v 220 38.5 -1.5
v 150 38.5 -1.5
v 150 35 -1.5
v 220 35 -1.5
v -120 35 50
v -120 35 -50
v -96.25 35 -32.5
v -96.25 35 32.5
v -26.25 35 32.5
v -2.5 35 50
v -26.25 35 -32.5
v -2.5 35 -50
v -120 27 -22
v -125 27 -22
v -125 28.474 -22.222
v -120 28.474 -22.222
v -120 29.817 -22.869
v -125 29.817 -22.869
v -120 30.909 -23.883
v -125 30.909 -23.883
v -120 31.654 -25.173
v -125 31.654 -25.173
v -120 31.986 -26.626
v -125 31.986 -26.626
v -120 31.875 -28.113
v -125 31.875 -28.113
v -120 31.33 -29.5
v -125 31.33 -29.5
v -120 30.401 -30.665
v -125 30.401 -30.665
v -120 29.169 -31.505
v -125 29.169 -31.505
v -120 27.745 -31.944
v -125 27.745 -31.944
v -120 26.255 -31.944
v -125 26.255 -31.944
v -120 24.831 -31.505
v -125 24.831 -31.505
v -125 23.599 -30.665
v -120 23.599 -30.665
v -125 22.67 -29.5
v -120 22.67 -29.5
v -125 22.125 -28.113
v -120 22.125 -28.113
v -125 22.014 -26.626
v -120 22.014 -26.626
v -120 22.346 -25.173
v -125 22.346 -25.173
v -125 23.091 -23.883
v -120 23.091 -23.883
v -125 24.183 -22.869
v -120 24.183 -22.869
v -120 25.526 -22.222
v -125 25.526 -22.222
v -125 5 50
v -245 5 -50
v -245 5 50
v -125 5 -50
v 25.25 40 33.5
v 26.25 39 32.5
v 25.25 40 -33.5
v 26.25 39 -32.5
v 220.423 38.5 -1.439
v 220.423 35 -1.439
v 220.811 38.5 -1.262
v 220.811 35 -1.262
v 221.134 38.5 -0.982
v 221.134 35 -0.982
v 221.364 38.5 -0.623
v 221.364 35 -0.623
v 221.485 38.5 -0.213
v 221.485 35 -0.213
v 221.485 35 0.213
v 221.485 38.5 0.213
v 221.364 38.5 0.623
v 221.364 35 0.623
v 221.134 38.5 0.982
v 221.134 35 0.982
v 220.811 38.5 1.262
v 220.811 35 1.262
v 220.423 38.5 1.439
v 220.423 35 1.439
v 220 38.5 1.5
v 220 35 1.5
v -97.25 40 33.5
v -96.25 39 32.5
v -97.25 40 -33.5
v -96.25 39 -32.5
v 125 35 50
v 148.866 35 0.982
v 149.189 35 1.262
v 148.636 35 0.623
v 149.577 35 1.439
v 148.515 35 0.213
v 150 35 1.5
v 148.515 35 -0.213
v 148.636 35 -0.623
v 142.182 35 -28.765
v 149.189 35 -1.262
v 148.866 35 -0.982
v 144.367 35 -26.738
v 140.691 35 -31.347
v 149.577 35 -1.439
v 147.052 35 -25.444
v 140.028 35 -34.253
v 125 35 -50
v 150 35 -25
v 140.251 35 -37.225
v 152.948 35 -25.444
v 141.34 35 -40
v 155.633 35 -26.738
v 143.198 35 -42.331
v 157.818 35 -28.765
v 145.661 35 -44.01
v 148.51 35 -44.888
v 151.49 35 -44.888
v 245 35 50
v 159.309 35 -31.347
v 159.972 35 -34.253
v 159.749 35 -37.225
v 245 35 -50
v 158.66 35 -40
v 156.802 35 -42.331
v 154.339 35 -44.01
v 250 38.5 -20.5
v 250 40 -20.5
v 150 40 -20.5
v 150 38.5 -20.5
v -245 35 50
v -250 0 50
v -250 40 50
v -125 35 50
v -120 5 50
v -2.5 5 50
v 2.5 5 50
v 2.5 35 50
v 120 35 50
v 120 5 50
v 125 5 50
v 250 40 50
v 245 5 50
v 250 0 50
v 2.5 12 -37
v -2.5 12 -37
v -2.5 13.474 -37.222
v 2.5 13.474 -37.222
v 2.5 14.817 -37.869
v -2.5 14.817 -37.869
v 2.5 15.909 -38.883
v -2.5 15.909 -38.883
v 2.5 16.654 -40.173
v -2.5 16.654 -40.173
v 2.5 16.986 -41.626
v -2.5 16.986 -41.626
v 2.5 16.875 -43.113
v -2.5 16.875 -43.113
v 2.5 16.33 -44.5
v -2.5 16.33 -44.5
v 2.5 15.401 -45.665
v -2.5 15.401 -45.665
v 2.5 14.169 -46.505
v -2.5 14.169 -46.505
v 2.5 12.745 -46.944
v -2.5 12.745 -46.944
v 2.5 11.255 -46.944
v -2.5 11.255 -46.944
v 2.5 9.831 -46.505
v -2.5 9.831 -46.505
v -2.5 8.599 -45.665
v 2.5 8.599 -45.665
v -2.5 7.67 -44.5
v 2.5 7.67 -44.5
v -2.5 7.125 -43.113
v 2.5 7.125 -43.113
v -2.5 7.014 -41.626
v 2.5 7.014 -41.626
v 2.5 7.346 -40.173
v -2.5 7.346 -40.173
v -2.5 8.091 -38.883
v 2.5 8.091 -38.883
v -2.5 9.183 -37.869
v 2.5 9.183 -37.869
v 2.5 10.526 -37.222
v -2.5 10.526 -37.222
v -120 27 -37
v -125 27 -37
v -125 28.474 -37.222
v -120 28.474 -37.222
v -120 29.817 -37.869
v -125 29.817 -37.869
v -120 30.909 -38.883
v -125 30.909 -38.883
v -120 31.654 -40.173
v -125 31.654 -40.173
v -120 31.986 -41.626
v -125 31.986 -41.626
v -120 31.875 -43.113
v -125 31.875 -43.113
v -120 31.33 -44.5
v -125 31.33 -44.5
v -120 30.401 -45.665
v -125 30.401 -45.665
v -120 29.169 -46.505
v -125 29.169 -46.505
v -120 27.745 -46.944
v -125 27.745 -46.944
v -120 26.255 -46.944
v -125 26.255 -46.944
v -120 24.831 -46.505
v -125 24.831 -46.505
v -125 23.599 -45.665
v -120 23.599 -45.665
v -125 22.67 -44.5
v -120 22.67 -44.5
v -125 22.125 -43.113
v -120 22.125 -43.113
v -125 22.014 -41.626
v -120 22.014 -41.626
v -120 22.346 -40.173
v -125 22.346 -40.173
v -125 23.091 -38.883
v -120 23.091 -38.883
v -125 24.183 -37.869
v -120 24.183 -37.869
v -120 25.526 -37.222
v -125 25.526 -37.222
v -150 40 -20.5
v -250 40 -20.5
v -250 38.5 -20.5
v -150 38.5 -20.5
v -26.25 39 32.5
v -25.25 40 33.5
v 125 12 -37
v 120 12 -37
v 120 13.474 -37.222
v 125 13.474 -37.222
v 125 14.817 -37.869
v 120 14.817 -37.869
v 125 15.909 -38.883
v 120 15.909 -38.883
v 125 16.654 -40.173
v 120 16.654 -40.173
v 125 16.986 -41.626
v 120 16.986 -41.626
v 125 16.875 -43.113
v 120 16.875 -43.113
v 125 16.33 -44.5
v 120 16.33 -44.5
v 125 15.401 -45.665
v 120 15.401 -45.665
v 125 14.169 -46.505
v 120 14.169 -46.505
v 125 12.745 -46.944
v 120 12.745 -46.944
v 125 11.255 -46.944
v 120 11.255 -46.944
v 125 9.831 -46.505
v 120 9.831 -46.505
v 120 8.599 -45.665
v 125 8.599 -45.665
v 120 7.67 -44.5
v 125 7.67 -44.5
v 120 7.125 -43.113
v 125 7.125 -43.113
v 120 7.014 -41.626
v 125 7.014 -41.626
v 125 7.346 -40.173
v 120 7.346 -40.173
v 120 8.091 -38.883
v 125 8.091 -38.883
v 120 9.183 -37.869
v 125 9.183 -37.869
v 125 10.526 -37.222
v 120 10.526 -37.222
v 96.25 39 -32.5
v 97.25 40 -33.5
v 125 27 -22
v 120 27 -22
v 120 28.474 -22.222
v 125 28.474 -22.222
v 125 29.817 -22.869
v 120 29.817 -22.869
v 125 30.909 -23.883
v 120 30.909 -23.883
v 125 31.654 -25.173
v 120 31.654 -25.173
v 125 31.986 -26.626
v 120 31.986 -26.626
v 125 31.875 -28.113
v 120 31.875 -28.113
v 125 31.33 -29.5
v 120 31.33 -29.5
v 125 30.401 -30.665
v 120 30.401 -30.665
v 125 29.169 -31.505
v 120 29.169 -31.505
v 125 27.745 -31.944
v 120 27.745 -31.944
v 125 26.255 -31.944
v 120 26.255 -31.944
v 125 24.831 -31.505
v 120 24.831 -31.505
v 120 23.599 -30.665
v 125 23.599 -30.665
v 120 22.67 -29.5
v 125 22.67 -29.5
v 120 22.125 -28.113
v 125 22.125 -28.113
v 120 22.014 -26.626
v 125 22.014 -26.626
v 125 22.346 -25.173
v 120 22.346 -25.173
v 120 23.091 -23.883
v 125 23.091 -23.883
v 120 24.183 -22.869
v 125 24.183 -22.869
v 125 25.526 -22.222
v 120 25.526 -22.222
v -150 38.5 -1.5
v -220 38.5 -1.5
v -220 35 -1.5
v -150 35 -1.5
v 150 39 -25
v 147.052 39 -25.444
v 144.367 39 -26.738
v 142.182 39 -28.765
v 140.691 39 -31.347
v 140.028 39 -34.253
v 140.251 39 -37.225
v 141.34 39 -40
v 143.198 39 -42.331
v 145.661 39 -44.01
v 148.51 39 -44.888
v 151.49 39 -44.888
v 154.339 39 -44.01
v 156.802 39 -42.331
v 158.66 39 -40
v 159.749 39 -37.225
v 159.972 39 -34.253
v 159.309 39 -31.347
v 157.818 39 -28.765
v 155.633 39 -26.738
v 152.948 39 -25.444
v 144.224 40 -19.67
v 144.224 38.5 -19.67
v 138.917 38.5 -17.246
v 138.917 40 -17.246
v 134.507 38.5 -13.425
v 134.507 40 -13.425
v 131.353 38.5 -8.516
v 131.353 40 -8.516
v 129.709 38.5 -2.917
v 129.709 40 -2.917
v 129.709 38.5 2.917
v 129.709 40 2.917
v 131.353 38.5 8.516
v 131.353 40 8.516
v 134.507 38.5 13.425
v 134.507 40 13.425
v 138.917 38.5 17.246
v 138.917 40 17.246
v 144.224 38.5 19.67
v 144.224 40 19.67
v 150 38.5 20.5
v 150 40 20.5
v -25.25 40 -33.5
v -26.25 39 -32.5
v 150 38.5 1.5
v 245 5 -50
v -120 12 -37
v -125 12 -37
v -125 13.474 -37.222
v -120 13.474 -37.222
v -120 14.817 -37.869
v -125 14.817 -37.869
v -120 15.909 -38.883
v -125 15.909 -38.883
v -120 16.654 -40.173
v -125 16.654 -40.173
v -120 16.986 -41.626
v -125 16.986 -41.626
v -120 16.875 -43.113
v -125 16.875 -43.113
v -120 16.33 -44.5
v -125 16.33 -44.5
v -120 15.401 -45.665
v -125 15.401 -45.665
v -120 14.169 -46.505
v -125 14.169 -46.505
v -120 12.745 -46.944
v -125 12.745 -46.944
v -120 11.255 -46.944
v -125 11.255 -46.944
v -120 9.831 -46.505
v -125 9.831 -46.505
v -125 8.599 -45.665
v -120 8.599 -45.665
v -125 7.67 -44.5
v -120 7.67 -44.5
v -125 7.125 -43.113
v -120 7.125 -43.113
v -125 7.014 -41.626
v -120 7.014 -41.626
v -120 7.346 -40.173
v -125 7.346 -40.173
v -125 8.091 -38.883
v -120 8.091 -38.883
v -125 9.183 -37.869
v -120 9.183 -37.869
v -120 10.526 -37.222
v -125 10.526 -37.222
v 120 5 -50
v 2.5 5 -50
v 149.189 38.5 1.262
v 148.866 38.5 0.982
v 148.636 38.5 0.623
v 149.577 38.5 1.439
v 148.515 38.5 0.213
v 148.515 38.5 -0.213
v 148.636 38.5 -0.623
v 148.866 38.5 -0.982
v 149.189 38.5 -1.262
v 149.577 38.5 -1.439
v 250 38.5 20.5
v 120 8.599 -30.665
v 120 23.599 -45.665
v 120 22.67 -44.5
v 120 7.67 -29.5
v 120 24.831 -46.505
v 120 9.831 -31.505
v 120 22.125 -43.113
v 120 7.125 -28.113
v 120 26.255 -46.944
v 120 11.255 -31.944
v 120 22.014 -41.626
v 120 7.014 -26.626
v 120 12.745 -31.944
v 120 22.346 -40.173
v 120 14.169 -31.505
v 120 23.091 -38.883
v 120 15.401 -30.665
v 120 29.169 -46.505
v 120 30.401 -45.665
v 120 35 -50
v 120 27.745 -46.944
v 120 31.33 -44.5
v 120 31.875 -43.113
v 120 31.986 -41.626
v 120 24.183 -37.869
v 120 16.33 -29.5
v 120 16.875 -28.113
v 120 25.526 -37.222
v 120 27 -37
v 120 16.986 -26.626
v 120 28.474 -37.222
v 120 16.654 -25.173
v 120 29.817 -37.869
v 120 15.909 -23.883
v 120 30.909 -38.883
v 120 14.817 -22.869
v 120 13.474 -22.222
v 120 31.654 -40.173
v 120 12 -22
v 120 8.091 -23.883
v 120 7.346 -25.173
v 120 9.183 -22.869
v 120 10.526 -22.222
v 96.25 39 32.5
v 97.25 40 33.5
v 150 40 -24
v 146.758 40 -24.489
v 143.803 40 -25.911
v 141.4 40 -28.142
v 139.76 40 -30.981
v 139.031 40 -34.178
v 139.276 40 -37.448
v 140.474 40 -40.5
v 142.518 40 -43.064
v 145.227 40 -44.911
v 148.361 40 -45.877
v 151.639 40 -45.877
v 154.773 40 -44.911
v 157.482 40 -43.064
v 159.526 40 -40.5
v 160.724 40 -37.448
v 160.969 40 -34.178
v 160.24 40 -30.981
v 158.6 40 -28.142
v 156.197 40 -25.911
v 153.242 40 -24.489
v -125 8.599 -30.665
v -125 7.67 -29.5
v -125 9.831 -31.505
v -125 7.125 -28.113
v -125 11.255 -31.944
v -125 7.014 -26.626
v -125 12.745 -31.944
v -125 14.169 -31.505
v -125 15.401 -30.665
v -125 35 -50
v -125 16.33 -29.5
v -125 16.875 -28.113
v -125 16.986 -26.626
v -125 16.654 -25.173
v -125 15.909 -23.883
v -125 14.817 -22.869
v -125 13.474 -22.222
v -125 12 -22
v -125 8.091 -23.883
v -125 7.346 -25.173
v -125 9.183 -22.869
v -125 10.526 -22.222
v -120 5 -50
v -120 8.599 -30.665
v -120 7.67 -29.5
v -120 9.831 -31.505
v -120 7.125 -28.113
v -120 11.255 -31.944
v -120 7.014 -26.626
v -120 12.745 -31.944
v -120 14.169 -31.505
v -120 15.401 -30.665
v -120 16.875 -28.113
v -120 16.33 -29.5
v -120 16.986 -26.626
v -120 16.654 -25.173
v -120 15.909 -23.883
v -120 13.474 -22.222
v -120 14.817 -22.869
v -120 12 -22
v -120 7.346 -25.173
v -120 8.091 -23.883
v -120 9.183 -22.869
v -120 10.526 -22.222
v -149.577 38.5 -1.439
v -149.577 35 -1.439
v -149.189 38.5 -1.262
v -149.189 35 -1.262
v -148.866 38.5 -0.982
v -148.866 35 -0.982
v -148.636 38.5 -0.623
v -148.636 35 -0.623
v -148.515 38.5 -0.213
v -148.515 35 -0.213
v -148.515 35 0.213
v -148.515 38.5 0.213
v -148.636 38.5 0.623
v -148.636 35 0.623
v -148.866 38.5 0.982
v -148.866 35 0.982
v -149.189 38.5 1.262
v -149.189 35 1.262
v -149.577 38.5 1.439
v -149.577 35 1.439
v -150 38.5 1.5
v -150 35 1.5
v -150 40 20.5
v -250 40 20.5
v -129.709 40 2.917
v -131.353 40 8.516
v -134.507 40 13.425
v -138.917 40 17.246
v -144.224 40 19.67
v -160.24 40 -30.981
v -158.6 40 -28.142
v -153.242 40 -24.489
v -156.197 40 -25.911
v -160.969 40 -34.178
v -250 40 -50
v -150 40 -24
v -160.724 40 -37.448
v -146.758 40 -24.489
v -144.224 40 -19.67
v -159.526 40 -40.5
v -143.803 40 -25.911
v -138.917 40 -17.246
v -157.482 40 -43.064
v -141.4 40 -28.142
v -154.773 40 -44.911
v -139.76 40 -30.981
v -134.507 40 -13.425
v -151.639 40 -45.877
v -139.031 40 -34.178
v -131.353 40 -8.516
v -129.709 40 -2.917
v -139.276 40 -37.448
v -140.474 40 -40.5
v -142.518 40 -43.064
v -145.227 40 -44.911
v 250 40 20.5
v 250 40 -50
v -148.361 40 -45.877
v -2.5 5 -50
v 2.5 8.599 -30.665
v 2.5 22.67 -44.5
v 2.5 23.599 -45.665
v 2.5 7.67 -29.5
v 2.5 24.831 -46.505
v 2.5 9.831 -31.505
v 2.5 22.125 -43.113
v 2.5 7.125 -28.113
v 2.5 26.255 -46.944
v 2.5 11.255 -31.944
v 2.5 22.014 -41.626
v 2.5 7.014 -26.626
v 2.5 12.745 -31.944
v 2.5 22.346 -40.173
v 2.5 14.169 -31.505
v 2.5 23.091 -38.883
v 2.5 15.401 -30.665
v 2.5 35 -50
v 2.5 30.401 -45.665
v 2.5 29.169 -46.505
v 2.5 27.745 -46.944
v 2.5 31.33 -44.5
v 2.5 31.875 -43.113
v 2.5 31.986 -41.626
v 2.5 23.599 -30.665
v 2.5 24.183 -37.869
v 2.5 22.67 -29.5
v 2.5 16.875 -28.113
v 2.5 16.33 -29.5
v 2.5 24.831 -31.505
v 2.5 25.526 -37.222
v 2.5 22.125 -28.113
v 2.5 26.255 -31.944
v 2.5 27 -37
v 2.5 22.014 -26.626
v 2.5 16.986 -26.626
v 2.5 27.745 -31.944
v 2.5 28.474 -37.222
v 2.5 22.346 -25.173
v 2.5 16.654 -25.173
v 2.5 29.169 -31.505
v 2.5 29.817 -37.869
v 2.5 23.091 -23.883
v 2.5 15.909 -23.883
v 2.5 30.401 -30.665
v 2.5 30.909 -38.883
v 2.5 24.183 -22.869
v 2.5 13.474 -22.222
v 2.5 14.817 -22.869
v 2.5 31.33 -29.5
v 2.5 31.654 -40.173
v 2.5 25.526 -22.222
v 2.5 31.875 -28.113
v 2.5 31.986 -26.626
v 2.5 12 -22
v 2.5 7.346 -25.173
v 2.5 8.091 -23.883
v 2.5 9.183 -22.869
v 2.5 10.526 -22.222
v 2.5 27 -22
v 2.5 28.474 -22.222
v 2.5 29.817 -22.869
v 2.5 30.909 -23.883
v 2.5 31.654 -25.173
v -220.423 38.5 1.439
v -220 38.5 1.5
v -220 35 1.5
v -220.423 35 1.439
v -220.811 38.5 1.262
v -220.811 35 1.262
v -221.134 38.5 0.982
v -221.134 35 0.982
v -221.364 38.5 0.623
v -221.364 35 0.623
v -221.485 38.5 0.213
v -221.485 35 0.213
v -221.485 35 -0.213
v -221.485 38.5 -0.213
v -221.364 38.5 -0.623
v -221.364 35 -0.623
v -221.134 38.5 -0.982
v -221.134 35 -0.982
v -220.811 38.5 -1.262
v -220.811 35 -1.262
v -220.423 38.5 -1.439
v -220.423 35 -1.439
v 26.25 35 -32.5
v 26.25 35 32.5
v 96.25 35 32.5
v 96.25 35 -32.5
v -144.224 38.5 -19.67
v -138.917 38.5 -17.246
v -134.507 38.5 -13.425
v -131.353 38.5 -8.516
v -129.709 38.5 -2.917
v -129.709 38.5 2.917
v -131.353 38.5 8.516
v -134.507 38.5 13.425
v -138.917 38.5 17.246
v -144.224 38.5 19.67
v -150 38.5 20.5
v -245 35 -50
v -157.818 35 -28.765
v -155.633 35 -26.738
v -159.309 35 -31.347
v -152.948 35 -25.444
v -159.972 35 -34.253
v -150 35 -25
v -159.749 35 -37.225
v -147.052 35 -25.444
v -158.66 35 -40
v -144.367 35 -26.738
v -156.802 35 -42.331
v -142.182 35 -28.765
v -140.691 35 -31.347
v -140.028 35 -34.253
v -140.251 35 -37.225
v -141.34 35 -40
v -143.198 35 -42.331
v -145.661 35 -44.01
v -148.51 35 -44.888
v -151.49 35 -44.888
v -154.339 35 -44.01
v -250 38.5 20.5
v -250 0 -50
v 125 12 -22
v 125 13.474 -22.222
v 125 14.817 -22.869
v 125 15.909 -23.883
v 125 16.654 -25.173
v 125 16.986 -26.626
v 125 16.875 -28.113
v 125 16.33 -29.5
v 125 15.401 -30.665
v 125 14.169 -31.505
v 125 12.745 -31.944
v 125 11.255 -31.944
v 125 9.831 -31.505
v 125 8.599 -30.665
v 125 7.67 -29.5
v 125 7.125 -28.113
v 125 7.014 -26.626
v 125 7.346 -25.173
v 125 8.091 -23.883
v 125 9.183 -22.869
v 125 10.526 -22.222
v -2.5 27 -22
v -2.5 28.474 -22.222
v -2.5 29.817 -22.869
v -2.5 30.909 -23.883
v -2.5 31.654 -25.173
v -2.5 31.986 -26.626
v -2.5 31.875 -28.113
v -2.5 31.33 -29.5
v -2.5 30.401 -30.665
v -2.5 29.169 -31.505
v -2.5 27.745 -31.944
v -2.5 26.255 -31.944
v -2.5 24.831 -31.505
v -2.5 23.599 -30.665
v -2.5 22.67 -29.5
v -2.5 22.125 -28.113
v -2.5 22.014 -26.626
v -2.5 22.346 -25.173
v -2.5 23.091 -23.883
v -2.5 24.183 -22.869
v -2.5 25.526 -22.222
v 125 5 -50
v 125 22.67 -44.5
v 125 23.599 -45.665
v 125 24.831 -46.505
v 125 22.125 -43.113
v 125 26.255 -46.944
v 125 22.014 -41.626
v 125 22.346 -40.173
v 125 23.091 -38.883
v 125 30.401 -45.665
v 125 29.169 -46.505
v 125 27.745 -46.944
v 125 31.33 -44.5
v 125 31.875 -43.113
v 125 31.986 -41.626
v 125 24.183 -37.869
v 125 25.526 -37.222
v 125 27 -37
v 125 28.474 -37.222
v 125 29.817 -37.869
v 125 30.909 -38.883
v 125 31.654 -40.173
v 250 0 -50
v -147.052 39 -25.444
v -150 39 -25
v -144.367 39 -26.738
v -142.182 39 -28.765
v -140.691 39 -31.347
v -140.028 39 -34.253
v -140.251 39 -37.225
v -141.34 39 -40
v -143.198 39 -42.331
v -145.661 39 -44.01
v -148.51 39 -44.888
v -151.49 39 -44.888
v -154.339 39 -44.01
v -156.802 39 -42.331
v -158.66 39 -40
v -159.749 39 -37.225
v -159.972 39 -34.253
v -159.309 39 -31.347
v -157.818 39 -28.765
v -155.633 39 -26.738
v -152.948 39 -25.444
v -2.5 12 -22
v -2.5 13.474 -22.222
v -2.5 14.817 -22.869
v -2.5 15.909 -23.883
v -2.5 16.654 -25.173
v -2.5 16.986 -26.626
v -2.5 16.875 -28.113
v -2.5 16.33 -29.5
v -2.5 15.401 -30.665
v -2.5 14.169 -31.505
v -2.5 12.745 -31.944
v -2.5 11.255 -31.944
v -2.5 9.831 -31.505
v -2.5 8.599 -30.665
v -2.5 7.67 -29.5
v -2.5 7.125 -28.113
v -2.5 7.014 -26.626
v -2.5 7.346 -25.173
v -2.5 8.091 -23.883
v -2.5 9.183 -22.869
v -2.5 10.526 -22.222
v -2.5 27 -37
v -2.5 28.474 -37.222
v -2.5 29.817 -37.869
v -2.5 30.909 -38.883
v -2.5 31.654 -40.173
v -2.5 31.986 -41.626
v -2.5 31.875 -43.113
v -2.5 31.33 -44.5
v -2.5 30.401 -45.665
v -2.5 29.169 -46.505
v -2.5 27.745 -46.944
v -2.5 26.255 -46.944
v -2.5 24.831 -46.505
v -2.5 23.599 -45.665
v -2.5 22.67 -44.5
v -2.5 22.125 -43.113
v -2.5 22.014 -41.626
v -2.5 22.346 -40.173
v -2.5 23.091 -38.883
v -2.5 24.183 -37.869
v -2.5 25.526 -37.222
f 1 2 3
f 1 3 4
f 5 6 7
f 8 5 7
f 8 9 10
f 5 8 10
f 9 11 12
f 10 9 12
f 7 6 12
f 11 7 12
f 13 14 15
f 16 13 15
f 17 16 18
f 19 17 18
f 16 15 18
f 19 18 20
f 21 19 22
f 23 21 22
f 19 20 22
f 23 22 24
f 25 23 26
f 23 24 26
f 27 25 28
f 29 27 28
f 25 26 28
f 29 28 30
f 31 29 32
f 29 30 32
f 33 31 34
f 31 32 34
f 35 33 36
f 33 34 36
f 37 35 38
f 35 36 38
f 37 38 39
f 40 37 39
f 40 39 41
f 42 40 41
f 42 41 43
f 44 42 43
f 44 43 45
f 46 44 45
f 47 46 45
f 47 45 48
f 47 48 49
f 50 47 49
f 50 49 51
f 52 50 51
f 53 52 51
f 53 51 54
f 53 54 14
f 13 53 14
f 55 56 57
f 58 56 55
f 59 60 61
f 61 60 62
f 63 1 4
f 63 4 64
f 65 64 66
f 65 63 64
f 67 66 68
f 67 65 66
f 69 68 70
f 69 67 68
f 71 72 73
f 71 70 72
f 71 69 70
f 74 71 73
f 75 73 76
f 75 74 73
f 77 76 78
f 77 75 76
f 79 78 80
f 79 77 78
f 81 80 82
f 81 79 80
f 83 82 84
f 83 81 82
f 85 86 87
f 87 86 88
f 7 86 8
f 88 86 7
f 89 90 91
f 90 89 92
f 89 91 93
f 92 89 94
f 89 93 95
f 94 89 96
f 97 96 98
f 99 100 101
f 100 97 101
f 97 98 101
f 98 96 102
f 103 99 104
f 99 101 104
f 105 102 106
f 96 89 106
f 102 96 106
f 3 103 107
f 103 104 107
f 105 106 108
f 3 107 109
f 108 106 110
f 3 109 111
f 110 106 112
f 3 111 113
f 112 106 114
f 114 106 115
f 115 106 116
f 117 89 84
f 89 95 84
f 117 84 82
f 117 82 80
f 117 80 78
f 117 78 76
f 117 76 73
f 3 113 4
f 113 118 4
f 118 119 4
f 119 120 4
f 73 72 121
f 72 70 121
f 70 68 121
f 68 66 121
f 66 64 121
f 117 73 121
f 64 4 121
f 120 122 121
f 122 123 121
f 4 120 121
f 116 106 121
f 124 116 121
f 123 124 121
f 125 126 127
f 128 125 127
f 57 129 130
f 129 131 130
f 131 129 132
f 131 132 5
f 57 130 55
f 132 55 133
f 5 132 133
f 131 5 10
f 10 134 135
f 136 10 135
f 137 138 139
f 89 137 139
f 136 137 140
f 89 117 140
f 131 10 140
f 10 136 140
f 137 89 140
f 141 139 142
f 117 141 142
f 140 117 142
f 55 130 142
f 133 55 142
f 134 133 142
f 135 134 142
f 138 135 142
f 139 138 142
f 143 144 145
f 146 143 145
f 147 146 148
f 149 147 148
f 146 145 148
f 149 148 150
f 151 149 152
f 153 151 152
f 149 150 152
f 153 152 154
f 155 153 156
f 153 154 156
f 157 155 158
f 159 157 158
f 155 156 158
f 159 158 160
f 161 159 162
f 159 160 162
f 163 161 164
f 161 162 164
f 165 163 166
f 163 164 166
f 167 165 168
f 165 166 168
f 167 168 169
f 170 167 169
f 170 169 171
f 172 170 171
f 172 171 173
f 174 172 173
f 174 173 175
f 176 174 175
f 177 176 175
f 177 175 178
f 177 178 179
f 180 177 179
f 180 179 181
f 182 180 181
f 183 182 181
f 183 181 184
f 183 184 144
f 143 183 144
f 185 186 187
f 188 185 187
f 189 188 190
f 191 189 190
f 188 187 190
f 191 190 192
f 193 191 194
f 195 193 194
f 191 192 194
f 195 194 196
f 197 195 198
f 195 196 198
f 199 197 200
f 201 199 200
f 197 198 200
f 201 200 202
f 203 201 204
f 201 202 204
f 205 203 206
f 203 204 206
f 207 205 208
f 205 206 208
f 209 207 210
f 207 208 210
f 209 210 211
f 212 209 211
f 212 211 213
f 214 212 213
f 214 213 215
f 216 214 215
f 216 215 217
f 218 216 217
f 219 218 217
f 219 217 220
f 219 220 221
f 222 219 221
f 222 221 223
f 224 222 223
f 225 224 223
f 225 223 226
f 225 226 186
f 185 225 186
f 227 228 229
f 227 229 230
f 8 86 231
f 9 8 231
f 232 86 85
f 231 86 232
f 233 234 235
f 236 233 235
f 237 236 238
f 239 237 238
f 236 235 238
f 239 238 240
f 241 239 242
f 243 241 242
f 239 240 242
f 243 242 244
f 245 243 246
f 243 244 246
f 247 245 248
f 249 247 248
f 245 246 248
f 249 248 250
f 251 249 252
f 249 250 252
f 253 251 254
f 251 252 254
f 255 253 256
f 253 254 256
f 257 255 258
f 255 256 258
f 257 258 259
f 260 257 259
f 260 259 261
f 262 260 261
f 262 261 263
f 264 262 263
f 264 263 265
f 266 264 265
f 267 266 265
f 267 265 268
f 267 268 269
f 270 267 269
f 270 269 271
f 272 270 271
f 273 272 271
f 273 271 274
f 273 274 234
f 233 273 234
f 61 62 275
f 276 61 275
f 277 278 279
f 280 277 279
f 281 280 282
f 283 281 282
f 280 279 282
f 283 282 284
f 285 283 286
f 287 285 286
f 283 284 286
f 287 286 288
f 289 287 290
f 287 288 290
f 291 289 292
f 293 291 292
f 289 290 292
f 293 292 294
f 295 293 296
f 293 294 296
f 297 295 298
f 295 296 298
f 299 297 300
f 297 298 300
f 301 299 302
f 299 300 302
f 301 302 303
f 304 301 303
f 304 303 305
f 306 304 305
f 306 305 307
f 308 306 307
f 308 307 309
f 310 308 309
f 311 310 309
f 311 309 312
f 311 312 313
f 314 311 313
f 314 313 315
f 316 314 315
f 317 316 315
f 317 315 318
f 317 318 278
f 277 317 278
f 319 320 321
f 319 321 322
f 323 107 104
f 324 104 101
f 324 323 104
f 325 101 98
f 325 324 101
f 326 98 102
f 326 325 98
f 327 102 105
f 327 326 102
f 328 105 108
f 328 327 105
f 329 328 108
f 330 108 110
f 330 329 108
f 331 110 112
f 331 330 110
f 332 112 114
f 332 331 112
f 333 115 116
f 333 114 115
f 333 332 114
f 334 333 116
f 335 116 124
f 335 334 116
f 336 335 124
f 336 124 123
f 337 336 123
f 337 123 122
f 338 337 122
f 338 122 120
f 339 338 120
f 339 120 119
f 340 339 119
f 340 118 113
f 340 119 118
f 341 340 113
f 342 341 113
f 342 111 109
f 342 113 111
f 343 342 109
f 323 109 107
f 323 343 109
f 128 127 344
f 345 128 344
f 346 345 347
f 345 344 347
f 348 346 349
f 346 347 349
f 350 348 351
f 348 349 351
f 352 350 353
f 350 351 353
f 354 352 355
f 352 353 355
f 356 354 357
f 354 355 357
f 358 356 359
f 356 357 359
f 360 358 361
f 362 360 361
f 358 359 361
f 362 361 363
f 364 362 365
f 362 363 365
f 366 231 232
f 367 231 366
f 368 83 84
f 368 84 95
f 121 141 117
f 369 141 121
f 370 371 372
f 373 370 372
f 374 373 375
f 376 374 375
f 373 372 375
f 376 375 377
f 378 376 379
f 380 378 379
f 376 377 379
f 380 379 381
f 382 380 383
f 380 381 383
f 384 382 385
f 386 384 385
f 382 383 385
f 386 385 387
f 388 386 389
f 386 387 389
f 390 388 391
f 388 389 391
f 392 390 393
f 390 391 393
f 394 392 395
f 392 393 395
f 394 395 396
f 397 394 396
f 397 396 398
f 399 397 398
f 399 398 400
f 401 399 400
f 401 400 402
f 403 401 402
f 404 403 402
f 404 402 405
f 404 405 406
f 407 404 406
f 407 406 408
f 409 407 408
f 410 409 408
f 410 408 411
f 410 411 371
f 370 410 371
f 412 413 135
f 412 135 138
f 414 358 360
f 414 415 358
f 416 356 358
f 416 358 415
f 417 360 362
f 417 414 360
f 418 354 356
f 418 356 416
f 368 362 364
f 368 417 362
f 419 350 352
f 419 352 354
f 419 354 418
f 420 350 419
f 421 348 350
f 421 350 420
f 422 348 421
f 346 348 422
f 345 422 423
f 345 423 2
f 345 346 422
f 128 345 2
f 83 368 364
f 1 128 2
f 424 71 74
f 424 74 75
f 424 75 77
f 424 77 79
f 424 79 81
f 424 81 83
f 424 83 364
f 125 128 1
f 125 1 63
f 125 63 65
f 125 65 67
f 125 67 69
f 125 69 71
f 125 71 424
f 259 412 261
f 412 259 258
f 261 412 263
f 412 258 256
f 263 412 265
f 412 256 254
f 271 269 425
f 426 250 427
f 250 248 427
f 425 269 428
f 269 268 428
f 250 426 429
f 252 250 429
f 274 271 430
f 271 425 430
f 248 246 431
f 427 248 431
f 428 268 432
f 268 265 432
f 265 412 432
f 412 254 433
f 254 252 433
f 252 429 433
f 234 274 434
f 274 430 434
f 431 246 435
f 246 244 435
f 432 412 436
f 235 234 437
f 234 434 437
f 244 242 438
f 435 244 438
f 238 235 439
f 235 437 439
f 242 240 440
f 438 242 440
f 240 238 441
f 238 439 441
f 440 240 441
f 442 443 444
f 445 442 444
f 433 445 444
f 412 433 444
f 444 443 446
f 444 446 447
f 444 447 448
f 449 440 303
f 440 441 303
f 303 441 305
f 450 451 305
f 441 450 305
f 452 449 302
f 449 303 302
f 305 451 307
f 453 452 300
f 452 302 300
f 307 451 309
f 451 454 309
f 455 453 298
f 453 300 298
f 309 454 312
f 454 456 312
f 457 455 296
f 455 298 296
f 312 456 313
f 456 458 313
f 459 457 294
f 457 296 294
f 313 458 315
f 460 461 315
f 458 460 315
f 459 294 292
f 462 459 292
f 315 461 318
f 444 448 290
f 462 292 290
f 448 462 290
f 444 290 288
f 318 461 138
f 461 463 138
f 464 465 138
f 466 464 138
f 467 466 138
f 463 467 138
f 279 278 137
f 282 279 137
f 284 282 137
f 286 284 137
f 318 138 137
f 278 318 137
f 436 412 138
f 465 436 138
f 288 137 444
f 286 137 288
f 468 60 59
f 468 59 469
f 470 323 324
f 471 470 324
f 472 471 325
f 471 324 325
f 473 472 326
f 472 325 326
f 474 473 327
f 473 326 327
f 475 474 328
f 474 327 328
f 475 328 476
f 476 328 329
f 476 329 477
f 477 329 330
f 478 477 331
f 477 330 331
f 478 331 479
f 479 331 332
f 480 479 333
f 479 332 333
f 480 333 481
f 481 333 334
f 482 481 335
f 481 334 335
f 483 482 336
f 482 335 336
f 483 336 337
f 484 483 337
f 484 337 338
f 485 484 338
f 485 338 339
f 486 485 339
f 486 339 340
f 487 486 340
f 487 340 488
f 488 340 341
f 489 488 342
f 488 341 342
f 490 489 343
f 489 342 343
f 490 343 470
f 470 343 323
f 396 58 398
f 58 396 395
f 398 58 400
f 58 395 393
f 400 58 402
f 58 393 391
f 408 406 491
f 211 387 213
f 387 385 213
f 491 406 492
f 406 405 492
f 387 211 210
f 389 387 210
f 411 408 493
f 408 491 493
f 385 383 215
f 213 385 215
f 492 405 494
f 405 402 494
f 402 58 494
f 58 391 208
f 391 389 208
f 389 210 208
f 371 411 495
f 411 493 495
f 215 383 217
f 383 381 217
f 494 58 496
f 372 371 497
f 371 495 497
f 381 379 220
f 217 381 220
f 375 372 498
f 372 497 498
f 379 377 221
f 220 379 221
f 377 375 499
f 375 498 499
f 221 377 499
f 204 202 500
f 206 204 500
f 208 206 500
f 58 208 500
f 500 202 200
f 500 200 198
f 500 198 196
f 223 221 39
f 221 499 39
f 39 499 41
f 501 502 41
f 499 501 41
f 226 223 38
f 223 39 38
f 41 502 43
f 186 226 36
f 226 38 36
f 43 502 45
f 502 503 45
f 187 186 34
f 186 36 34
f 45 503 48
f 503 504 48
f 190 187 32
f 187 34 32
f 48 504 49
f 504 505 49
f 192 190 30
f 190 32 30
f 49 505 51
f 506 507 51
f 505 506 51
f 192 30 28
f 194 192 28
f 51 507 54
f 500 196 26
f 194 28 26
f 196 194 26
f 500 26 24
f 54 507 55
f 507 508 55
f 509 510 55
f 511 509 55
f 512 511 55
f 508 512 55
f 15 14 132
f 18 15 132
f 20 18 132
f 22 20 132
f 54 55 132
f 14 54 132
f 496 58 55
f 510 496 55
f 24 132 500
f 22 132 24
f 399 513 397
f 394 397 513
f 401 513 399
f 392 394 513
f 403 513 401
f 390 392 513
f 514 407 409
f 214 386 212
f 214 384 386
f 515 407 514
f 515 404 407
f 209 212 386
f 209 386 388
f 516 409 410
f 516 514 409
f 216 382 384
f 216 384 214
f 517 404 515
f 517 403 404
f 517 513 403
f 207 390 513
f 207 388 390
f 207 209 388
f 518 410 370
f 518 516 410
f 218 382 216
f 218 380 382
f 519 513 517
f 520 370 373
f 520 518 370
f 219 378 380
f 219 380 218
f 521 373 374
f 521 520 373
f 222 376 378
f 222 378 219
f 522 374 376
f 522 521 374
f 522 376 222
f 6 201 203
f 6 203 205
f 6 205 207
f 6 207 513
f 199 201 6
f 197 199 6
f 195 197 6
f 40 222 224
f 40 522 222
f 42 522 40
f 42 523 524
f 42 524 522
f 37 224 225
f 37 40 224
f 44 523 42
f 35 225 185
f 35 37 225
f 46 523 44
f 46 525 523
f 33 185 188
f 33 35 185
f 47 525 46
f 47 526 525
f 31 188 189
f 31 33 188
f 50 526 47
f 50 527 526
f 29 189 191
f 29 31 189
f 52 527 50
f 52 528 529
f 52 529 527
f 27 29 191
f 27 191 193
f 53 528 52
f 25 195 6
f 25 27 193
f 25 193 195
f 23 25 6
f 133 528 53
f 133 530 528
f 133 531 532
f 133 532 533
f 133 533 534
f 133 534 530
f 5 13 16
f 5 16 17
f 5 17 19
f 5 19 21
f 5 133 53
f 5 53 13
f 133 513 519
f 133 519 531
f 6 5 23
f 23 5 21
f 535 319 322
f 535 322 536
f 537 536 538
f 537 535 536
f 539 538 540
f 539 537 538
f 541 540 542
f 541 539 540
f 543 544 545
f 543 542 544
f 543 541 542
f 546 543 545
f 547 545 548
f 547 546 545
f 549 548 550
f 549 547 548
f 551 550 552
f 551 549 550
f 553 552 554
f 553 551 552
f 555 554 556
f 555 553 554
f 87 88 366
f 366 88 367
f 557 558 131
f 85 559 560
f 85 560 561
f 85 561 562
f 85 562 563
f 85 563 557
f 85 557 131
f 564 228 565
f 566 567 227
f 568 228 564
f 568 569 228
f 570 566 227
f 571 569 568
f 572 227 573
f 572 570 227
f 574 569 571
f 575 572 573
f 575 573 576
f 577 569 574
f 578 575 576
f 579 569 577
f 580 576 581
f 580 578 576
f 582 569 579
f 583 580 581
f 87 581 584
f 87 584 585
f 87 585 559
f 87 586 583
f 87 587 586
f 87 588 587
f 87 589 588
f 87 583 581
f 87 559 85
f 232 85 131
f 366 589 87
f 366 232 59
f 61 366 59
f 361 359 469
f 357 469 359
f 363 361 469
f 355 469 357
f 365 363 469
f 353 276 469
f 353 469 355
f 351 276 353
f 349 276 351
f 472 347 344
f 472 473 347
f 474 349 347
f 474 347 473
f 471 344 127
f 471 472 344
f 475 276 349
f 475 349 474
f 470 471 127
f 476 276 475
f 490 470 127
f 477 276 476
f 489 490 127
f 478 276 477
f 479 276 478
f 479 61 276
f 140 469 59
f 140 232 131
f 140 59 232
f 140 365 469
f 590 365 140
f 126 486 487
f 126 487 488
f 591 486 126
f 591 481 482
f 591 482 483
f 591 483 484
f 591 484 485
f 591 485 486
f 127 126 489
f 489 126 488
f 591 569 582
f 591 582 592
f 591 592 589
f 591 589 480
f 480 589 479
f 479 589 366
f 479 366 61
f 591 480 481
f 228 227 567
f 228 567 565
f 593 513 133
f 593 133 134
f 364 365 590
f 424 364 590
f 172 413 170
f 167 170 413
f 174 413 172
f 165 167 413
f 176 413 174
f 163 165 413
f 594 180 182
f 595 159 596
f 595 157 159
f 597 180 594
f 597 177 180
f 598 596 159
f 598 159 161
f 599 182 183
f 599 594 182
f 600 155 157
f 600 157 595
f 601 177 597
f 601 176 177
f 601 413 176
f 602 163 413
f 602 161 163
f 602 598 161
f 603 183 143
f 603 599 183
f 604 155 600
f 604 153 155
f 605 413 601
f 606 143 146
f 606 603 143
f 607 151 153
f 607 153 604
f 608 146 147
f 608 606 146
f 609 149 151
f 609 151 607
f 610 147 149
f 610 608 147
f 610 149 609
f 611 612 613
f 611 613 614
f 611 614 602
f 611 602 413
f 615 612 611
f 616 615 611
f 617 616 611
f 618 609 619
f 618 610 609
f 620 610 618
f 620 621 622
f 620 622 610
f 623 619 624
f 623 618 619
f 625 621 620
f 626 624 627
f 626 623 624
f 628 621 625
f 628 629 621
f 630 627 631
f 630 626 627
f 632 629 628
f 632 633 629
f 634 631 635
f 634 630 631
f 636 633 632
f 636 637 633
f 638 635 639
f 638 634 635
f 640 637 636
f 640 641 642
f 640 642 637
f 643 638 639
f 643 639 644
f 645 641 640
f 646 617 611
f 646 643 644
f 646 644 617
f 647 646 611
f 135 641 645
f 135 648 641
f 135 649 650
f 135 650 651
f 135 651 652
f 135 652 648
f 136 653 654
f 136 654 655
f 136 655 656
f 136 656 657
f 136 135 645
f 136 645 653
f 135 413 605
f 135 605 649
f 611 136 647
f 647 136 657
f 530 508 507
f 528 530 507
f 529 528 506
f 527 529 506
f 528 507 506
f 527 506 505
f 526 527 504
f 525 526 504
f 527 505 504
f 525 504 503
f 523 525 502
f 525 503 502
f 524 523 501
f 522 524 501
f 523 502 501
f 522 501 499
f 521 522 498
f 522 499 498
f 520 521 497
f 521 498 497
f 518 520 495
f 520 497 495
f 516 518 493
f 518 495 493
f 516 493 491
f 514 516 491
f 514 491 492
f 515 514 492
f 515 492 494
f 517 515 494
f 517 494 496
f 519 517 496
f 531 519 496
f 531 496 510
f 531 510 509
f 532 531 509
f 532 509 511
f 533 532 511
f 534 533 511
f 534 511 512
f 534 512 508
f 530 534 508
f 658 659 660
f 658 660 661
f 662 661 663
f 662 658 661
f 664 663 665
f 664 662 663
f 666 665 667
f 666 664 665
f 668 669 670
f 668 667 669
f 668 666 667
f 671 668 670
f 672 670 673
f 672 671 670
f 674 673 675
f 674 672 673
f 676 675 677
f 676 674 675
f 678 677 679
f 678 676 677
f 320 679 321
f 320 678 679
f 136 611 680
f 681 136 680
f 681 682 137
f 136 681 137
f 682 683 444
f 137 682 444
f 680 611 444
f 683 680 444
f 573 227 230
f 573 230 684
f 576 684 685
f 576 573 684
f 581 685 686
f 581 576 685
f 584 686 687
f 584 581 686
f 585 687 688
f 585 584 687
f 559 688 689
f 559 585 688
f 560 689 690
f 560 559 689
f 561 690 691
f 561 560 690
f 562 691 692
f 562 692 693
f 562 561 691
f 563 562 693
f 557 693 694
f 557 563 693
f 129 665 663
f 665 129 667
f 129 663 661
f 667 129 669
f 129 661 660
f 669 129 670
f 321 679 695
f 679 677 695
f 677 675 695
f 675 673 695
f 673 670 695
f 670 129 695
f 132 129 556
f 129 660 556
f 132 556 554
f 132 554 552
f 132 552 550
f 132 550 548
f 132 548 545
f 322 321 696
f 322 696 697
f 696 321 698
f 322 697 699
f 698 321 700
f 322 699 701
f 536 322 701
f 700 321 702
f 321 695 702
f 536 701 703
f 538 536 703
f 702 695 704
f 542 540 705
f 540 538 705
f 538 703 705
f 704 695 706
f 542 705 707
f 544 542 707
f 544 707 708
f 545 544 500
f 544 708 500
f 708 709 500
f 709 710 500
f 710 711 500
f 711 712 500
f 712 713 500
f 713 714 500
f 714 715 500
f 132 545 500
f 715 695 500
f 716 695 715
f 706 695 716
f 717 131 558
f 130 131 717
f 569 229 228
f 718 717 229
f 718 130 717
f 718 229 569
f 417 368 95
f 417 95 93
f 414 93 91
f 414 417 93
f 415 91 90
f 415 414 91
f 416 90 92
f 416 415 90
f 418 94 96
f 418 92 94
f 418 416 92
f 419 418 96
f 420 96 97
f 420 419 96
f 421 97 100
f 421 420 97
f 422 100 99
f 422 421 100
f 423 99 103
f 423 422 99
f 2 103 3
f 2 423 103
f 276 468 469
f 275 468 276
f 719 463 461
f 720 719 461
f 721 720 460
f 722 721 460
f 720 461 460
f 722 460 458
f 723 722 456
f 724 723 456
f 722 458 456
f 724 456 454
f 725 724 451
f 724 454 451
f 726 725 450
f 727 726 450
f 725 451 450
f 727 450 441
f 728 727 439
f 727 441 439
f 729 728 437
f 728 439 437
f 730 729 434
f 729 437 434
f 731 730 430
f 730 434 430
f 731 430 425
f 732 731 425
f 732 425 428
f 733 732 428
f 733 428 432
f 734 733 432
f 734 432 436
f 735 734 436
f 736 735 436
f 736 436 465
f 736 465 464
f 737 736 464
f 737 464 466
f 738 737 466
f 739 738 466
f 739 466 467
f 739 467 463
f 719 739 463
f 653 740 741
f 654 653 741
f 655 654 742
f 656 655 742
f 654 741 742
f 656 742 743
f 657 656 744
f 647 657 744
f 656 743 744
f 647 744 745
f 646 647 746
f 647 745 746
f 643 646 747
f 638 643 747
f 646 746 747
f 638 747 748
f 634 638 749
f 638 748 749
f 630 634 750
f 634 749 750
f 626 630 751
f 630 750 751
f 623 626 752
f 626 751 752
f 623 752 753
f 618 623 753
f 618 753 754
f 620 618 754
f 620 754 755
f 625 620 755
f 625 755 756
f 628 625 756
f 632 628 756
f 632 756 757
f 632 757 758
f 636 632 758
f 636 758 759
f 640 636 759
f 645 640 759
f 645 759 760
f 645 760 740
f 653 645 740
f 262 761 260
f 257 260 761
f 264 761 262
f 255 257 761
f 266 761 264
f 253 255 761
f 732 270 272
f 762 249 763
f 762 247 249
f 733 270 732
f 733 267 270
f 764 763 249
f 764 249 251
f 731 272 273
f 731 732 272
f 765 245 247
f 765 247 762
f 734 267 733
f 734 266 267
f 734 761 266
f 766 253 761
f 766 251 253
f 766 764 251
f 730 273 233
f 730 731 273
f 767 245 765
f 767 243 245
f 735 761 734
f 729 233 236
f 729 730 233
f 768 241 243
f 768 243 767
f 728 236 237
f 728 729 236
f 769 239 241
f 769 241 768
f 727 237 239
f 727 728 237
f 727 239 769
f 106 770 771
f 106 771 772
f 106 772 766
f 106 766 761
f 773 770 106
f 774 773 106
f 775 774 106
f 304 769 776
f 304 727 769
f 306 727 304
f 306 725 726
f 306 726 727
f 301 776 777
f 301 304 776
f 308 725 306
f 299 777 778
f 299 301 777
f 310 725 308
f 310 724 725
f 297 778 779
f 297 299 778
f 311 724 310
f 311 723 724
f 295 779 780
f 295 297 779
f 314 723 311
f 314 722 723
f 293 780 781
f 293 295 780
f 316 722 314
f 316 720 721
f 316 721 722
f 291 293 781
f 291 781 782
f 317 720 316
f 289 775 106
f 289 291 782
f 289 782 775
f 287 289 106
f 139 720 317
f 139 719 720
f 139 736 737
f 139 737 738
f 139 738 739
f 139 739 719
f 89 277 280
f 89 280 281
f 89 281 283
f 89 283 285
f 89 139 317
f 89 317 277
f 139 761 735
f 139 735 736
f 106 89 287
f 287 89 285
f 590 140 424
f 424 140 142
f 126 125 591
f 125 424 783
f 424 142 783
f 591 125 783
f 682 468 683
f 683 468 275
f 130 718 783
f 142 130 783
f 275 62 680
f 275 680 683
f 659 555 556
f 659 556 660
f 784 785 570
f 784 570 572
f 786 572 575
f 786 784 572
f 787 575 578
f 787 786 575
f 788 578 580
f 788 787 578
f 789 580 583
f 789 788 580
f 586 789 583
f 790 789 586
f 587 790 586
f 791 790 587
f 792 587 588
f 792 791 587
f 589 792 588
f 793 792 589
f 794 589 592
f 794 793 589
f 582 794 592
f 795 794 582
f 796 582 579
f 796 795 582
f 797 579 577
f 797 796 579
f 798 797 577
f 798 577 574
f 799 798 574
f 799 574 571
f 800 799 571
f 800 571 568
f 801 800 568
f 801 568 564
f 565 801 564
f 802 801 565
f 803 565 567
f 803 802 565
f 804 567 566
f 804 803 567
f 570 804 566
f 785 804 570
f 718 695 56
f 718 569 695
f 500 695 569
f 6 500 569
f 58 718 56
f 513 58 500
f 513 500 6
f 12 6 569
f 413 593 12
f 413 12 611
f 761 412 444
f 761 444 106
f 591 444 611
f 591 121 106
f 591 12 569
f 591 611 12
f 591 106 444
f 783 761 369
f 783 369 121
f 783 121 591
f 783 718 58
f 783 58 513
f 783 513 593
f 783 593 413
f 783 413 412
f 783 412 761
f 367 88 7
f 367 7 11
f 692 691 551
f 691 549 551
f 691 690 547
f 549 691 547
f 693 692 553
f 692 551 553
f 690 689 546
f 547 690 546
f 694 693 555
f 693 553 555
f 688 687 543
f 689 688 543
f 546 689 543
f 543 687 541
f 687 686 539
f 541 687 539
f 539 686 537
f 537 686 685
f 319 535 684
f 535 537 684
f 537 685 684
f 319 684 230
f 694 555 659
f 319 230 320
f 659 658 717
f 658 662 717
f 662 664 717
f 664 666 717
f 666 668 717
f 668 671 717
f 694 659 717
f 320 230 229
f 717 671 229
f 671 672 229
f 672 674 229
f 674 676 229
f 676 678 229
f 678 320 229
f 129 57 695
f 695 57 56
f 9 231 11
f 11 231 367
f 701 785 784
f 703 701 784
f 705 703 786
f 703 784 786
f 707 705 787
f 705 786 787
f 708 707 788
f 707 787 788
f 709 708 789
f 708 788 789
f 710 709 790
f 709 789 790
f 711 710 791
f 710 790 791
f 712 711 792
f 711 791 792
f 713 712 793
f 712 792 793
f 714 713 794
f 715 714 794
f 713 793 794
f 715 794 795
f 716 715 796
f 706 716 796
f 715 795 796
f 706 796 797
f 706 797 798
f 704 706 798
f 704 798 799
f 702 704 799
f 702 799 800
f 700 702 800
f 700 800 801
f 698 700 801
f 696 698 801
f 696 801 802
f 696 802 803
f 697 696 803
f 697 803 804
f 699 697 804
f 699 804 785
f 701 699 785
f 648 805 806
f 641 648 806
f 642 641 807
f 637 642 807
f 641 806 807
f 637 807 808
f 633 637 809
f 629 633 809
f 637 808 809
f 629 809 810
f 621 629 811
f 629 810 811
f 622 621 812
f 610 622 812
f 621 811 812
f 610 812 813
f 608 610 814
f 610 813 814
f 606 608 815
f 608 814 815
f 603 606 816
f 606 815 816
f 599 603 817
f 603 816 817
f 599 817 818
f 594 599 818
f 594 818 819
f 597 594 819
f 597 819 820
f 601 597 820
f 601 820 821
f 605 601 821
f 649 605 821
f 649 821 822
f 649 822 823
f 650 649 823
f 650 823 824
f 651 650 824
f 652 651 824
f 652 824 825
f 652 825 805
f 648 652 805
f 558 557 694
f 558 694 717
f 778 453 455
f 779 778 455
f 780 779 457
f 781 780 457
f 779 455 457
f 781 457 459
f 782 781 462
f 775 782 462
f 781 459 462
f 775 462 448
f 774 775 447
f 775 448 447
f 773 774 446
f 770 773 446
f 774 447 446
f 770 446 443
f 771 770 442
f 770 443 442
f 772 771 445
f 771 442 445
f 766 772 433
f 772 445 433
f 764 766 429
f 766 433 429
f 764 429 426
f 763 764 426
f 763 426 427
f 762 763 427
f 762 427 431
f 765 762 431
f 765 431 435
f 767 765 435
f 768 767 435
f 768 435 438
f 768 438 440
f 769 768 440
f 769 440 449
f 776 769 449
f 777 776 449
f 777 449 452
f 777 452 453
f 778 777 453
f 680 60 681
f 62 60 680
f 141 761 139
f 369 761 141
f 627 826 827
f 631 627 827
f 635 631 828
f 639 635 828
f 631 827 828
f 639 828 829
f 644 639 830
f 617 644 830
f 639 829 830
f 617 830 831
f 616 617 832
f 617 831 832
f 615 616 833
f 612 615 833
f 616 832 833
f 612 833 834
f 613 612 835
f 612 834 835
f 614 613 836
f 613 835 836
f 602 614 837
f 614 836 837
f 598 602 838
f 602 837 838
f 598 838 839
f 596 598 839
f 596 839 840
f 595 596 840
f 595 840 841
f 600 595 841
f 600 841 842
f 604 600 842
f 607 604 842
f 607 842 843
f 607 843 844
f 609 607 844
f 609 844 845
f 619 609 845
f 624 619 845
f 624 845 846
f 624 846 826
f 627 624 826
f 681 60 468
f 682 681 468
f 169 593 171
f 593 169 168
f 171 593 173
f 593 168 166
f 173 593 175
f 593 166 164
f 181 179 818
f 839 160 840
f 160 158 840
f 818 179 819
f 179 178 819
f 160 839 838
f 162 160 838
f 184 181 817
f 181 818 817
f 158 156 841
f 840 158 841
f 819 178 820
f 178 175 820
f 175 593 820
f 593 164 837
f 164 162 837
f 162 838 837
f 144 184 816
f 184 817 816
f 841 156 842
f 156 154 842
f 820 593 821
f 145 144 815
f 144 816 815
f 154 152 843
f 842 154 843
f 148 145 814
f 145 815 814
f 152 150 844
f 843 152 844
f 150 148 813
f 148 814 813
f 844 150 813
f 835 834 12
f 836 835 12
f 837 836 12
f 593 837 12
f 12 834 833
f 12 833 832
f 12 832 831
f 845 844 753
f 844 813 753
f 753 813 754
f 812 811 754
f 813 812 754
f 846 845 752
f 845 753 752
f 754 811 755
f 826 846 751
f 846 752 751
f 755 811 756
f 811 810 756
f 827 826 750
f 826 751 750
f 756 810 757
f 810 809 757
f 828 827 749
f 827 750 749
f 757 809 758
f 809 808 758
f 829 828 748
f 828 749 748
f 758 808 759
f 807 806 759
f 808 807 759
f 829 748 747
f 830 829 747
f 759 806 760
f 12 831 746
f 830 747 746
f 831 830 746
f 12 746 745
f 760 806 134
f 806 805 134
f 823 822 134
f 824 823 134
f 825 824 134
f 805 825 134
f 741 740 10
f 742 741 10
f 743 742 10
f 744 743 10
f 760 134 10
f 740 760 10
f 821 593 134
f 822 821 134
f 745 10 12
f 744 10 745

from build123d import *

# Parameters (mm, degrees)
CROQUIS1_W              = 500
CROQUIS1_H              = 100
SALIENTE_EXTRUIR1_DEPTH = 40
VACIADO1_T              = -5
CROQUIS2_W              = 2.5
CROQUIS2_H              = 30
SALIENTE_EXTRUIR2_DEPTH = 100
CORTAR_EXTRUIR1_DEPTH   = 1.5
CORTAR_EXTRUIR2_DEPTH   = 5
CROQUIS5_R              = 10
CORTAR_EXTRUIR3_DEPTH   = 22.5
CROQUIS6_R              = 5
CORTAR_EXTRUIR4_DEPTH   = 281.5
CROQUIS7_W              = 70
CROQUIS7_H              = 65
CORTAR_EXTRUIR5_DEPTH   = 5
CHAFL_N1_SIZE           = 1
CHAFL_N2_SIZE           = 1


with BuildPart() as part:
    # Croquis1 → Saliente-Extruir1 (new body)
    with BuildSketch(Plane(origin=(0, 0, 0), x_dir=(1, 0, 0), z_dir=(0, 1, 0))):
        Rectangle(CROQUIS1_W, CROQUIS1_H)
    extrude(amount=SALIENTE_EXTRUIR1_DEPTH)

    # Vaciado1
    vaciado1_openings = [part.faces().sort_by_distance(p)[0] for p in [
        (0, 20, -50),
        (0, 20, 50),
    ]]
    offset(amount=VACIADO1_T, openings=vaciado1_openings, kind=Kind.INTERSECTION)

    # Croquis2 → Saliente-Extruir2 (add)
    with BuildSketch(Plane.XY.offset(50)):
        with Locations((-123.75, 20)):
            Rectangle(CROQUIS2_W, CROQUIS2_H)
        with Locations((-121.25, 20)):
            Rectangle(CROQUIS2_W, CROQUIS2_H)
        with Locations((-1.25, 20)):
            Rectangle(CROQUIS2_W, CROQUIS2_H)
        with Locations((1.25, 20)):
            Rectangle(CROQUIS2_W, CROQUIS2_H)
        with Locations((121.25, 20)):
            Rectangle(CROQUIS2_W, CROQUIS2_H)
        with Locations((123.75, 20)):
            Rectangle(CROQUIS2_W, CROQUIS2_H)
    extrude(amount=-SALIENTE_EXTRUIR2_DEPTH)

    # Croquis3 → Cortar-Extruir1 (cut)
    with BuildSketch(Plane(origin=(0, 40, 0), x_dir=(1, 0, 0), z_dir=(0, 1, 0))):
        with BuildLine():
            Line((-250, 20.5), (-150, 20.5))
            ThreePointArc((-150, 20.5), (-129.5, 0), (-150, -20.5))
            Line((-150, -20.5), (-250, -20.5))
            Line((-250, -20.5), (-250, 20.5))
        make_face()
        with BuildLine():
            Line((250, 20.5), (150, 20.5))
            ThreePointArc((150, 20.5), (129.5, 0), (150, -20.5))
            Line((150, -20.5), (250, -20.5))
            Line((250, -20.5), (250, 20.5))
        make_face()
    extrude(amount=-CORTAR_EXTRUIR1_DEPTH, mode=Mode.SUBTRACT)

    # Croquis4 → Cortar-Extruir2 (cut)
    with BuildSketch(Plane(origin=(0, 38.5, 0), x_dir=(1, 0, 0), z_dir=(0, 1, 0))):
        with BuildLine():
            Line((-150, -1.5), (-220, -1.5))
            ThreePointArc((-220, -1.5), (-221.5, 0), (-220, 1.5))
            Line((-220, 1.5), (-150, 1.5))
            ThreePointArc((-150, 1.5), (-148.5, 0), (-150, -1.5))
        make_face()
        with BuildLine():
            Line((150, 1.5), (220, 1.5))
            ThreePointArc((220, 1.5), (221.5, 0), (220, -1.5))
            Line((220, -1.5), (150, -1.5))
            ThreePointArc((150, -1.5), (148.5, 0), (150, 1.5))
        make_face()
    extrude(amount=-CORTAR_EXTRUIR2_DEPTH, mode=Mode.SUBTRACT)

    # Croquis5 → Cortar-Extruir3 (cut)
    with BuildSketch(Plane(origin=(0, 40, 0), x_dir=(1, 0, 0), z_dir=(0, 1, 0))):
        with Locations(Location((-150, 35, 0), (0, 0, 270))):
            Circle(CROQUIS5_R)
    cortar_extruir3 = extrude(amount=-CORTAR_EXTRUIR3_DEPTH, mode=Mode.SUBTRACT)

    # Simetría1: Cortar-Extruir3 across plane
    add(cortar_extruir3.mirror(Plane(origin=(0, 0, 0), x_dir=(0, 0, 1), z_dir=(1, 0, 0))), mode=Mode.SUBTRACT)

    # Croquis6 → Cortar-Extruir4 (cut)
    with BuildSketch(Plane.ZY.offset(125)):
        with Locations((-42, 27)):
            Circle(CROQUIS6_R)
        with Locations((-27, 27)):
            Circle(CROQUIS6_R)
        with Locations((-27, 12)):
            Circle(CROQUIS6_R)
        with Locations((-42, 12)):
            Circle(CROQUIS6_R)
    extrude(amount=-CORTAR_EXTRUIR4_DEPTH, mode=Mode.SUBTRACT)

    # Croquis7 → Cortar-Extruir5 (cut)
    with BuildSketch(Plane(origin=(0, 40, 0), x_dir=(1, 0, 0), z_dir=(0, 1, 0))):
        with Locations((-61.25, 0)):
            Rectangle(CROQUIS7_W, CROQUIS7_H)
        with Locations((61.25, 0)):
            Rectangle(CROQUIS7_W, CROQUIS7_H)
    extrude(amount=-CORTAR_EXTRUIR5_DEPTH, mode=Mode.SUBTRACT)

    # Chaflán1
    chafl_n1_edges = [part.edges().sort_by_distance(p)[0] for p in [
        (-96.25, 40, 0),
        (-61.25, 40, 32.5),
        (-26.25, 40, 0),
        (-61.25, 40, -32.5),
        (61.25, 40, 32.5),
        (96.25, 40, 0),
        (61.25, 40, -32.5),
        (26.25, 40, 0),
    ]]
    chamfer(chafl_n1_edges, length=CHAFL_N1_SIZE)

    # Chaflán2
    chafl_n2_edges = [part.edges().sort_by_distance(p)[0] for p in [
        (-150, 40, -45),
        (150, 40, -45),
    ]]
    chamfer(chafl_n2_edges, length=CHAFL_N2_SIZE)


solid = part.part
